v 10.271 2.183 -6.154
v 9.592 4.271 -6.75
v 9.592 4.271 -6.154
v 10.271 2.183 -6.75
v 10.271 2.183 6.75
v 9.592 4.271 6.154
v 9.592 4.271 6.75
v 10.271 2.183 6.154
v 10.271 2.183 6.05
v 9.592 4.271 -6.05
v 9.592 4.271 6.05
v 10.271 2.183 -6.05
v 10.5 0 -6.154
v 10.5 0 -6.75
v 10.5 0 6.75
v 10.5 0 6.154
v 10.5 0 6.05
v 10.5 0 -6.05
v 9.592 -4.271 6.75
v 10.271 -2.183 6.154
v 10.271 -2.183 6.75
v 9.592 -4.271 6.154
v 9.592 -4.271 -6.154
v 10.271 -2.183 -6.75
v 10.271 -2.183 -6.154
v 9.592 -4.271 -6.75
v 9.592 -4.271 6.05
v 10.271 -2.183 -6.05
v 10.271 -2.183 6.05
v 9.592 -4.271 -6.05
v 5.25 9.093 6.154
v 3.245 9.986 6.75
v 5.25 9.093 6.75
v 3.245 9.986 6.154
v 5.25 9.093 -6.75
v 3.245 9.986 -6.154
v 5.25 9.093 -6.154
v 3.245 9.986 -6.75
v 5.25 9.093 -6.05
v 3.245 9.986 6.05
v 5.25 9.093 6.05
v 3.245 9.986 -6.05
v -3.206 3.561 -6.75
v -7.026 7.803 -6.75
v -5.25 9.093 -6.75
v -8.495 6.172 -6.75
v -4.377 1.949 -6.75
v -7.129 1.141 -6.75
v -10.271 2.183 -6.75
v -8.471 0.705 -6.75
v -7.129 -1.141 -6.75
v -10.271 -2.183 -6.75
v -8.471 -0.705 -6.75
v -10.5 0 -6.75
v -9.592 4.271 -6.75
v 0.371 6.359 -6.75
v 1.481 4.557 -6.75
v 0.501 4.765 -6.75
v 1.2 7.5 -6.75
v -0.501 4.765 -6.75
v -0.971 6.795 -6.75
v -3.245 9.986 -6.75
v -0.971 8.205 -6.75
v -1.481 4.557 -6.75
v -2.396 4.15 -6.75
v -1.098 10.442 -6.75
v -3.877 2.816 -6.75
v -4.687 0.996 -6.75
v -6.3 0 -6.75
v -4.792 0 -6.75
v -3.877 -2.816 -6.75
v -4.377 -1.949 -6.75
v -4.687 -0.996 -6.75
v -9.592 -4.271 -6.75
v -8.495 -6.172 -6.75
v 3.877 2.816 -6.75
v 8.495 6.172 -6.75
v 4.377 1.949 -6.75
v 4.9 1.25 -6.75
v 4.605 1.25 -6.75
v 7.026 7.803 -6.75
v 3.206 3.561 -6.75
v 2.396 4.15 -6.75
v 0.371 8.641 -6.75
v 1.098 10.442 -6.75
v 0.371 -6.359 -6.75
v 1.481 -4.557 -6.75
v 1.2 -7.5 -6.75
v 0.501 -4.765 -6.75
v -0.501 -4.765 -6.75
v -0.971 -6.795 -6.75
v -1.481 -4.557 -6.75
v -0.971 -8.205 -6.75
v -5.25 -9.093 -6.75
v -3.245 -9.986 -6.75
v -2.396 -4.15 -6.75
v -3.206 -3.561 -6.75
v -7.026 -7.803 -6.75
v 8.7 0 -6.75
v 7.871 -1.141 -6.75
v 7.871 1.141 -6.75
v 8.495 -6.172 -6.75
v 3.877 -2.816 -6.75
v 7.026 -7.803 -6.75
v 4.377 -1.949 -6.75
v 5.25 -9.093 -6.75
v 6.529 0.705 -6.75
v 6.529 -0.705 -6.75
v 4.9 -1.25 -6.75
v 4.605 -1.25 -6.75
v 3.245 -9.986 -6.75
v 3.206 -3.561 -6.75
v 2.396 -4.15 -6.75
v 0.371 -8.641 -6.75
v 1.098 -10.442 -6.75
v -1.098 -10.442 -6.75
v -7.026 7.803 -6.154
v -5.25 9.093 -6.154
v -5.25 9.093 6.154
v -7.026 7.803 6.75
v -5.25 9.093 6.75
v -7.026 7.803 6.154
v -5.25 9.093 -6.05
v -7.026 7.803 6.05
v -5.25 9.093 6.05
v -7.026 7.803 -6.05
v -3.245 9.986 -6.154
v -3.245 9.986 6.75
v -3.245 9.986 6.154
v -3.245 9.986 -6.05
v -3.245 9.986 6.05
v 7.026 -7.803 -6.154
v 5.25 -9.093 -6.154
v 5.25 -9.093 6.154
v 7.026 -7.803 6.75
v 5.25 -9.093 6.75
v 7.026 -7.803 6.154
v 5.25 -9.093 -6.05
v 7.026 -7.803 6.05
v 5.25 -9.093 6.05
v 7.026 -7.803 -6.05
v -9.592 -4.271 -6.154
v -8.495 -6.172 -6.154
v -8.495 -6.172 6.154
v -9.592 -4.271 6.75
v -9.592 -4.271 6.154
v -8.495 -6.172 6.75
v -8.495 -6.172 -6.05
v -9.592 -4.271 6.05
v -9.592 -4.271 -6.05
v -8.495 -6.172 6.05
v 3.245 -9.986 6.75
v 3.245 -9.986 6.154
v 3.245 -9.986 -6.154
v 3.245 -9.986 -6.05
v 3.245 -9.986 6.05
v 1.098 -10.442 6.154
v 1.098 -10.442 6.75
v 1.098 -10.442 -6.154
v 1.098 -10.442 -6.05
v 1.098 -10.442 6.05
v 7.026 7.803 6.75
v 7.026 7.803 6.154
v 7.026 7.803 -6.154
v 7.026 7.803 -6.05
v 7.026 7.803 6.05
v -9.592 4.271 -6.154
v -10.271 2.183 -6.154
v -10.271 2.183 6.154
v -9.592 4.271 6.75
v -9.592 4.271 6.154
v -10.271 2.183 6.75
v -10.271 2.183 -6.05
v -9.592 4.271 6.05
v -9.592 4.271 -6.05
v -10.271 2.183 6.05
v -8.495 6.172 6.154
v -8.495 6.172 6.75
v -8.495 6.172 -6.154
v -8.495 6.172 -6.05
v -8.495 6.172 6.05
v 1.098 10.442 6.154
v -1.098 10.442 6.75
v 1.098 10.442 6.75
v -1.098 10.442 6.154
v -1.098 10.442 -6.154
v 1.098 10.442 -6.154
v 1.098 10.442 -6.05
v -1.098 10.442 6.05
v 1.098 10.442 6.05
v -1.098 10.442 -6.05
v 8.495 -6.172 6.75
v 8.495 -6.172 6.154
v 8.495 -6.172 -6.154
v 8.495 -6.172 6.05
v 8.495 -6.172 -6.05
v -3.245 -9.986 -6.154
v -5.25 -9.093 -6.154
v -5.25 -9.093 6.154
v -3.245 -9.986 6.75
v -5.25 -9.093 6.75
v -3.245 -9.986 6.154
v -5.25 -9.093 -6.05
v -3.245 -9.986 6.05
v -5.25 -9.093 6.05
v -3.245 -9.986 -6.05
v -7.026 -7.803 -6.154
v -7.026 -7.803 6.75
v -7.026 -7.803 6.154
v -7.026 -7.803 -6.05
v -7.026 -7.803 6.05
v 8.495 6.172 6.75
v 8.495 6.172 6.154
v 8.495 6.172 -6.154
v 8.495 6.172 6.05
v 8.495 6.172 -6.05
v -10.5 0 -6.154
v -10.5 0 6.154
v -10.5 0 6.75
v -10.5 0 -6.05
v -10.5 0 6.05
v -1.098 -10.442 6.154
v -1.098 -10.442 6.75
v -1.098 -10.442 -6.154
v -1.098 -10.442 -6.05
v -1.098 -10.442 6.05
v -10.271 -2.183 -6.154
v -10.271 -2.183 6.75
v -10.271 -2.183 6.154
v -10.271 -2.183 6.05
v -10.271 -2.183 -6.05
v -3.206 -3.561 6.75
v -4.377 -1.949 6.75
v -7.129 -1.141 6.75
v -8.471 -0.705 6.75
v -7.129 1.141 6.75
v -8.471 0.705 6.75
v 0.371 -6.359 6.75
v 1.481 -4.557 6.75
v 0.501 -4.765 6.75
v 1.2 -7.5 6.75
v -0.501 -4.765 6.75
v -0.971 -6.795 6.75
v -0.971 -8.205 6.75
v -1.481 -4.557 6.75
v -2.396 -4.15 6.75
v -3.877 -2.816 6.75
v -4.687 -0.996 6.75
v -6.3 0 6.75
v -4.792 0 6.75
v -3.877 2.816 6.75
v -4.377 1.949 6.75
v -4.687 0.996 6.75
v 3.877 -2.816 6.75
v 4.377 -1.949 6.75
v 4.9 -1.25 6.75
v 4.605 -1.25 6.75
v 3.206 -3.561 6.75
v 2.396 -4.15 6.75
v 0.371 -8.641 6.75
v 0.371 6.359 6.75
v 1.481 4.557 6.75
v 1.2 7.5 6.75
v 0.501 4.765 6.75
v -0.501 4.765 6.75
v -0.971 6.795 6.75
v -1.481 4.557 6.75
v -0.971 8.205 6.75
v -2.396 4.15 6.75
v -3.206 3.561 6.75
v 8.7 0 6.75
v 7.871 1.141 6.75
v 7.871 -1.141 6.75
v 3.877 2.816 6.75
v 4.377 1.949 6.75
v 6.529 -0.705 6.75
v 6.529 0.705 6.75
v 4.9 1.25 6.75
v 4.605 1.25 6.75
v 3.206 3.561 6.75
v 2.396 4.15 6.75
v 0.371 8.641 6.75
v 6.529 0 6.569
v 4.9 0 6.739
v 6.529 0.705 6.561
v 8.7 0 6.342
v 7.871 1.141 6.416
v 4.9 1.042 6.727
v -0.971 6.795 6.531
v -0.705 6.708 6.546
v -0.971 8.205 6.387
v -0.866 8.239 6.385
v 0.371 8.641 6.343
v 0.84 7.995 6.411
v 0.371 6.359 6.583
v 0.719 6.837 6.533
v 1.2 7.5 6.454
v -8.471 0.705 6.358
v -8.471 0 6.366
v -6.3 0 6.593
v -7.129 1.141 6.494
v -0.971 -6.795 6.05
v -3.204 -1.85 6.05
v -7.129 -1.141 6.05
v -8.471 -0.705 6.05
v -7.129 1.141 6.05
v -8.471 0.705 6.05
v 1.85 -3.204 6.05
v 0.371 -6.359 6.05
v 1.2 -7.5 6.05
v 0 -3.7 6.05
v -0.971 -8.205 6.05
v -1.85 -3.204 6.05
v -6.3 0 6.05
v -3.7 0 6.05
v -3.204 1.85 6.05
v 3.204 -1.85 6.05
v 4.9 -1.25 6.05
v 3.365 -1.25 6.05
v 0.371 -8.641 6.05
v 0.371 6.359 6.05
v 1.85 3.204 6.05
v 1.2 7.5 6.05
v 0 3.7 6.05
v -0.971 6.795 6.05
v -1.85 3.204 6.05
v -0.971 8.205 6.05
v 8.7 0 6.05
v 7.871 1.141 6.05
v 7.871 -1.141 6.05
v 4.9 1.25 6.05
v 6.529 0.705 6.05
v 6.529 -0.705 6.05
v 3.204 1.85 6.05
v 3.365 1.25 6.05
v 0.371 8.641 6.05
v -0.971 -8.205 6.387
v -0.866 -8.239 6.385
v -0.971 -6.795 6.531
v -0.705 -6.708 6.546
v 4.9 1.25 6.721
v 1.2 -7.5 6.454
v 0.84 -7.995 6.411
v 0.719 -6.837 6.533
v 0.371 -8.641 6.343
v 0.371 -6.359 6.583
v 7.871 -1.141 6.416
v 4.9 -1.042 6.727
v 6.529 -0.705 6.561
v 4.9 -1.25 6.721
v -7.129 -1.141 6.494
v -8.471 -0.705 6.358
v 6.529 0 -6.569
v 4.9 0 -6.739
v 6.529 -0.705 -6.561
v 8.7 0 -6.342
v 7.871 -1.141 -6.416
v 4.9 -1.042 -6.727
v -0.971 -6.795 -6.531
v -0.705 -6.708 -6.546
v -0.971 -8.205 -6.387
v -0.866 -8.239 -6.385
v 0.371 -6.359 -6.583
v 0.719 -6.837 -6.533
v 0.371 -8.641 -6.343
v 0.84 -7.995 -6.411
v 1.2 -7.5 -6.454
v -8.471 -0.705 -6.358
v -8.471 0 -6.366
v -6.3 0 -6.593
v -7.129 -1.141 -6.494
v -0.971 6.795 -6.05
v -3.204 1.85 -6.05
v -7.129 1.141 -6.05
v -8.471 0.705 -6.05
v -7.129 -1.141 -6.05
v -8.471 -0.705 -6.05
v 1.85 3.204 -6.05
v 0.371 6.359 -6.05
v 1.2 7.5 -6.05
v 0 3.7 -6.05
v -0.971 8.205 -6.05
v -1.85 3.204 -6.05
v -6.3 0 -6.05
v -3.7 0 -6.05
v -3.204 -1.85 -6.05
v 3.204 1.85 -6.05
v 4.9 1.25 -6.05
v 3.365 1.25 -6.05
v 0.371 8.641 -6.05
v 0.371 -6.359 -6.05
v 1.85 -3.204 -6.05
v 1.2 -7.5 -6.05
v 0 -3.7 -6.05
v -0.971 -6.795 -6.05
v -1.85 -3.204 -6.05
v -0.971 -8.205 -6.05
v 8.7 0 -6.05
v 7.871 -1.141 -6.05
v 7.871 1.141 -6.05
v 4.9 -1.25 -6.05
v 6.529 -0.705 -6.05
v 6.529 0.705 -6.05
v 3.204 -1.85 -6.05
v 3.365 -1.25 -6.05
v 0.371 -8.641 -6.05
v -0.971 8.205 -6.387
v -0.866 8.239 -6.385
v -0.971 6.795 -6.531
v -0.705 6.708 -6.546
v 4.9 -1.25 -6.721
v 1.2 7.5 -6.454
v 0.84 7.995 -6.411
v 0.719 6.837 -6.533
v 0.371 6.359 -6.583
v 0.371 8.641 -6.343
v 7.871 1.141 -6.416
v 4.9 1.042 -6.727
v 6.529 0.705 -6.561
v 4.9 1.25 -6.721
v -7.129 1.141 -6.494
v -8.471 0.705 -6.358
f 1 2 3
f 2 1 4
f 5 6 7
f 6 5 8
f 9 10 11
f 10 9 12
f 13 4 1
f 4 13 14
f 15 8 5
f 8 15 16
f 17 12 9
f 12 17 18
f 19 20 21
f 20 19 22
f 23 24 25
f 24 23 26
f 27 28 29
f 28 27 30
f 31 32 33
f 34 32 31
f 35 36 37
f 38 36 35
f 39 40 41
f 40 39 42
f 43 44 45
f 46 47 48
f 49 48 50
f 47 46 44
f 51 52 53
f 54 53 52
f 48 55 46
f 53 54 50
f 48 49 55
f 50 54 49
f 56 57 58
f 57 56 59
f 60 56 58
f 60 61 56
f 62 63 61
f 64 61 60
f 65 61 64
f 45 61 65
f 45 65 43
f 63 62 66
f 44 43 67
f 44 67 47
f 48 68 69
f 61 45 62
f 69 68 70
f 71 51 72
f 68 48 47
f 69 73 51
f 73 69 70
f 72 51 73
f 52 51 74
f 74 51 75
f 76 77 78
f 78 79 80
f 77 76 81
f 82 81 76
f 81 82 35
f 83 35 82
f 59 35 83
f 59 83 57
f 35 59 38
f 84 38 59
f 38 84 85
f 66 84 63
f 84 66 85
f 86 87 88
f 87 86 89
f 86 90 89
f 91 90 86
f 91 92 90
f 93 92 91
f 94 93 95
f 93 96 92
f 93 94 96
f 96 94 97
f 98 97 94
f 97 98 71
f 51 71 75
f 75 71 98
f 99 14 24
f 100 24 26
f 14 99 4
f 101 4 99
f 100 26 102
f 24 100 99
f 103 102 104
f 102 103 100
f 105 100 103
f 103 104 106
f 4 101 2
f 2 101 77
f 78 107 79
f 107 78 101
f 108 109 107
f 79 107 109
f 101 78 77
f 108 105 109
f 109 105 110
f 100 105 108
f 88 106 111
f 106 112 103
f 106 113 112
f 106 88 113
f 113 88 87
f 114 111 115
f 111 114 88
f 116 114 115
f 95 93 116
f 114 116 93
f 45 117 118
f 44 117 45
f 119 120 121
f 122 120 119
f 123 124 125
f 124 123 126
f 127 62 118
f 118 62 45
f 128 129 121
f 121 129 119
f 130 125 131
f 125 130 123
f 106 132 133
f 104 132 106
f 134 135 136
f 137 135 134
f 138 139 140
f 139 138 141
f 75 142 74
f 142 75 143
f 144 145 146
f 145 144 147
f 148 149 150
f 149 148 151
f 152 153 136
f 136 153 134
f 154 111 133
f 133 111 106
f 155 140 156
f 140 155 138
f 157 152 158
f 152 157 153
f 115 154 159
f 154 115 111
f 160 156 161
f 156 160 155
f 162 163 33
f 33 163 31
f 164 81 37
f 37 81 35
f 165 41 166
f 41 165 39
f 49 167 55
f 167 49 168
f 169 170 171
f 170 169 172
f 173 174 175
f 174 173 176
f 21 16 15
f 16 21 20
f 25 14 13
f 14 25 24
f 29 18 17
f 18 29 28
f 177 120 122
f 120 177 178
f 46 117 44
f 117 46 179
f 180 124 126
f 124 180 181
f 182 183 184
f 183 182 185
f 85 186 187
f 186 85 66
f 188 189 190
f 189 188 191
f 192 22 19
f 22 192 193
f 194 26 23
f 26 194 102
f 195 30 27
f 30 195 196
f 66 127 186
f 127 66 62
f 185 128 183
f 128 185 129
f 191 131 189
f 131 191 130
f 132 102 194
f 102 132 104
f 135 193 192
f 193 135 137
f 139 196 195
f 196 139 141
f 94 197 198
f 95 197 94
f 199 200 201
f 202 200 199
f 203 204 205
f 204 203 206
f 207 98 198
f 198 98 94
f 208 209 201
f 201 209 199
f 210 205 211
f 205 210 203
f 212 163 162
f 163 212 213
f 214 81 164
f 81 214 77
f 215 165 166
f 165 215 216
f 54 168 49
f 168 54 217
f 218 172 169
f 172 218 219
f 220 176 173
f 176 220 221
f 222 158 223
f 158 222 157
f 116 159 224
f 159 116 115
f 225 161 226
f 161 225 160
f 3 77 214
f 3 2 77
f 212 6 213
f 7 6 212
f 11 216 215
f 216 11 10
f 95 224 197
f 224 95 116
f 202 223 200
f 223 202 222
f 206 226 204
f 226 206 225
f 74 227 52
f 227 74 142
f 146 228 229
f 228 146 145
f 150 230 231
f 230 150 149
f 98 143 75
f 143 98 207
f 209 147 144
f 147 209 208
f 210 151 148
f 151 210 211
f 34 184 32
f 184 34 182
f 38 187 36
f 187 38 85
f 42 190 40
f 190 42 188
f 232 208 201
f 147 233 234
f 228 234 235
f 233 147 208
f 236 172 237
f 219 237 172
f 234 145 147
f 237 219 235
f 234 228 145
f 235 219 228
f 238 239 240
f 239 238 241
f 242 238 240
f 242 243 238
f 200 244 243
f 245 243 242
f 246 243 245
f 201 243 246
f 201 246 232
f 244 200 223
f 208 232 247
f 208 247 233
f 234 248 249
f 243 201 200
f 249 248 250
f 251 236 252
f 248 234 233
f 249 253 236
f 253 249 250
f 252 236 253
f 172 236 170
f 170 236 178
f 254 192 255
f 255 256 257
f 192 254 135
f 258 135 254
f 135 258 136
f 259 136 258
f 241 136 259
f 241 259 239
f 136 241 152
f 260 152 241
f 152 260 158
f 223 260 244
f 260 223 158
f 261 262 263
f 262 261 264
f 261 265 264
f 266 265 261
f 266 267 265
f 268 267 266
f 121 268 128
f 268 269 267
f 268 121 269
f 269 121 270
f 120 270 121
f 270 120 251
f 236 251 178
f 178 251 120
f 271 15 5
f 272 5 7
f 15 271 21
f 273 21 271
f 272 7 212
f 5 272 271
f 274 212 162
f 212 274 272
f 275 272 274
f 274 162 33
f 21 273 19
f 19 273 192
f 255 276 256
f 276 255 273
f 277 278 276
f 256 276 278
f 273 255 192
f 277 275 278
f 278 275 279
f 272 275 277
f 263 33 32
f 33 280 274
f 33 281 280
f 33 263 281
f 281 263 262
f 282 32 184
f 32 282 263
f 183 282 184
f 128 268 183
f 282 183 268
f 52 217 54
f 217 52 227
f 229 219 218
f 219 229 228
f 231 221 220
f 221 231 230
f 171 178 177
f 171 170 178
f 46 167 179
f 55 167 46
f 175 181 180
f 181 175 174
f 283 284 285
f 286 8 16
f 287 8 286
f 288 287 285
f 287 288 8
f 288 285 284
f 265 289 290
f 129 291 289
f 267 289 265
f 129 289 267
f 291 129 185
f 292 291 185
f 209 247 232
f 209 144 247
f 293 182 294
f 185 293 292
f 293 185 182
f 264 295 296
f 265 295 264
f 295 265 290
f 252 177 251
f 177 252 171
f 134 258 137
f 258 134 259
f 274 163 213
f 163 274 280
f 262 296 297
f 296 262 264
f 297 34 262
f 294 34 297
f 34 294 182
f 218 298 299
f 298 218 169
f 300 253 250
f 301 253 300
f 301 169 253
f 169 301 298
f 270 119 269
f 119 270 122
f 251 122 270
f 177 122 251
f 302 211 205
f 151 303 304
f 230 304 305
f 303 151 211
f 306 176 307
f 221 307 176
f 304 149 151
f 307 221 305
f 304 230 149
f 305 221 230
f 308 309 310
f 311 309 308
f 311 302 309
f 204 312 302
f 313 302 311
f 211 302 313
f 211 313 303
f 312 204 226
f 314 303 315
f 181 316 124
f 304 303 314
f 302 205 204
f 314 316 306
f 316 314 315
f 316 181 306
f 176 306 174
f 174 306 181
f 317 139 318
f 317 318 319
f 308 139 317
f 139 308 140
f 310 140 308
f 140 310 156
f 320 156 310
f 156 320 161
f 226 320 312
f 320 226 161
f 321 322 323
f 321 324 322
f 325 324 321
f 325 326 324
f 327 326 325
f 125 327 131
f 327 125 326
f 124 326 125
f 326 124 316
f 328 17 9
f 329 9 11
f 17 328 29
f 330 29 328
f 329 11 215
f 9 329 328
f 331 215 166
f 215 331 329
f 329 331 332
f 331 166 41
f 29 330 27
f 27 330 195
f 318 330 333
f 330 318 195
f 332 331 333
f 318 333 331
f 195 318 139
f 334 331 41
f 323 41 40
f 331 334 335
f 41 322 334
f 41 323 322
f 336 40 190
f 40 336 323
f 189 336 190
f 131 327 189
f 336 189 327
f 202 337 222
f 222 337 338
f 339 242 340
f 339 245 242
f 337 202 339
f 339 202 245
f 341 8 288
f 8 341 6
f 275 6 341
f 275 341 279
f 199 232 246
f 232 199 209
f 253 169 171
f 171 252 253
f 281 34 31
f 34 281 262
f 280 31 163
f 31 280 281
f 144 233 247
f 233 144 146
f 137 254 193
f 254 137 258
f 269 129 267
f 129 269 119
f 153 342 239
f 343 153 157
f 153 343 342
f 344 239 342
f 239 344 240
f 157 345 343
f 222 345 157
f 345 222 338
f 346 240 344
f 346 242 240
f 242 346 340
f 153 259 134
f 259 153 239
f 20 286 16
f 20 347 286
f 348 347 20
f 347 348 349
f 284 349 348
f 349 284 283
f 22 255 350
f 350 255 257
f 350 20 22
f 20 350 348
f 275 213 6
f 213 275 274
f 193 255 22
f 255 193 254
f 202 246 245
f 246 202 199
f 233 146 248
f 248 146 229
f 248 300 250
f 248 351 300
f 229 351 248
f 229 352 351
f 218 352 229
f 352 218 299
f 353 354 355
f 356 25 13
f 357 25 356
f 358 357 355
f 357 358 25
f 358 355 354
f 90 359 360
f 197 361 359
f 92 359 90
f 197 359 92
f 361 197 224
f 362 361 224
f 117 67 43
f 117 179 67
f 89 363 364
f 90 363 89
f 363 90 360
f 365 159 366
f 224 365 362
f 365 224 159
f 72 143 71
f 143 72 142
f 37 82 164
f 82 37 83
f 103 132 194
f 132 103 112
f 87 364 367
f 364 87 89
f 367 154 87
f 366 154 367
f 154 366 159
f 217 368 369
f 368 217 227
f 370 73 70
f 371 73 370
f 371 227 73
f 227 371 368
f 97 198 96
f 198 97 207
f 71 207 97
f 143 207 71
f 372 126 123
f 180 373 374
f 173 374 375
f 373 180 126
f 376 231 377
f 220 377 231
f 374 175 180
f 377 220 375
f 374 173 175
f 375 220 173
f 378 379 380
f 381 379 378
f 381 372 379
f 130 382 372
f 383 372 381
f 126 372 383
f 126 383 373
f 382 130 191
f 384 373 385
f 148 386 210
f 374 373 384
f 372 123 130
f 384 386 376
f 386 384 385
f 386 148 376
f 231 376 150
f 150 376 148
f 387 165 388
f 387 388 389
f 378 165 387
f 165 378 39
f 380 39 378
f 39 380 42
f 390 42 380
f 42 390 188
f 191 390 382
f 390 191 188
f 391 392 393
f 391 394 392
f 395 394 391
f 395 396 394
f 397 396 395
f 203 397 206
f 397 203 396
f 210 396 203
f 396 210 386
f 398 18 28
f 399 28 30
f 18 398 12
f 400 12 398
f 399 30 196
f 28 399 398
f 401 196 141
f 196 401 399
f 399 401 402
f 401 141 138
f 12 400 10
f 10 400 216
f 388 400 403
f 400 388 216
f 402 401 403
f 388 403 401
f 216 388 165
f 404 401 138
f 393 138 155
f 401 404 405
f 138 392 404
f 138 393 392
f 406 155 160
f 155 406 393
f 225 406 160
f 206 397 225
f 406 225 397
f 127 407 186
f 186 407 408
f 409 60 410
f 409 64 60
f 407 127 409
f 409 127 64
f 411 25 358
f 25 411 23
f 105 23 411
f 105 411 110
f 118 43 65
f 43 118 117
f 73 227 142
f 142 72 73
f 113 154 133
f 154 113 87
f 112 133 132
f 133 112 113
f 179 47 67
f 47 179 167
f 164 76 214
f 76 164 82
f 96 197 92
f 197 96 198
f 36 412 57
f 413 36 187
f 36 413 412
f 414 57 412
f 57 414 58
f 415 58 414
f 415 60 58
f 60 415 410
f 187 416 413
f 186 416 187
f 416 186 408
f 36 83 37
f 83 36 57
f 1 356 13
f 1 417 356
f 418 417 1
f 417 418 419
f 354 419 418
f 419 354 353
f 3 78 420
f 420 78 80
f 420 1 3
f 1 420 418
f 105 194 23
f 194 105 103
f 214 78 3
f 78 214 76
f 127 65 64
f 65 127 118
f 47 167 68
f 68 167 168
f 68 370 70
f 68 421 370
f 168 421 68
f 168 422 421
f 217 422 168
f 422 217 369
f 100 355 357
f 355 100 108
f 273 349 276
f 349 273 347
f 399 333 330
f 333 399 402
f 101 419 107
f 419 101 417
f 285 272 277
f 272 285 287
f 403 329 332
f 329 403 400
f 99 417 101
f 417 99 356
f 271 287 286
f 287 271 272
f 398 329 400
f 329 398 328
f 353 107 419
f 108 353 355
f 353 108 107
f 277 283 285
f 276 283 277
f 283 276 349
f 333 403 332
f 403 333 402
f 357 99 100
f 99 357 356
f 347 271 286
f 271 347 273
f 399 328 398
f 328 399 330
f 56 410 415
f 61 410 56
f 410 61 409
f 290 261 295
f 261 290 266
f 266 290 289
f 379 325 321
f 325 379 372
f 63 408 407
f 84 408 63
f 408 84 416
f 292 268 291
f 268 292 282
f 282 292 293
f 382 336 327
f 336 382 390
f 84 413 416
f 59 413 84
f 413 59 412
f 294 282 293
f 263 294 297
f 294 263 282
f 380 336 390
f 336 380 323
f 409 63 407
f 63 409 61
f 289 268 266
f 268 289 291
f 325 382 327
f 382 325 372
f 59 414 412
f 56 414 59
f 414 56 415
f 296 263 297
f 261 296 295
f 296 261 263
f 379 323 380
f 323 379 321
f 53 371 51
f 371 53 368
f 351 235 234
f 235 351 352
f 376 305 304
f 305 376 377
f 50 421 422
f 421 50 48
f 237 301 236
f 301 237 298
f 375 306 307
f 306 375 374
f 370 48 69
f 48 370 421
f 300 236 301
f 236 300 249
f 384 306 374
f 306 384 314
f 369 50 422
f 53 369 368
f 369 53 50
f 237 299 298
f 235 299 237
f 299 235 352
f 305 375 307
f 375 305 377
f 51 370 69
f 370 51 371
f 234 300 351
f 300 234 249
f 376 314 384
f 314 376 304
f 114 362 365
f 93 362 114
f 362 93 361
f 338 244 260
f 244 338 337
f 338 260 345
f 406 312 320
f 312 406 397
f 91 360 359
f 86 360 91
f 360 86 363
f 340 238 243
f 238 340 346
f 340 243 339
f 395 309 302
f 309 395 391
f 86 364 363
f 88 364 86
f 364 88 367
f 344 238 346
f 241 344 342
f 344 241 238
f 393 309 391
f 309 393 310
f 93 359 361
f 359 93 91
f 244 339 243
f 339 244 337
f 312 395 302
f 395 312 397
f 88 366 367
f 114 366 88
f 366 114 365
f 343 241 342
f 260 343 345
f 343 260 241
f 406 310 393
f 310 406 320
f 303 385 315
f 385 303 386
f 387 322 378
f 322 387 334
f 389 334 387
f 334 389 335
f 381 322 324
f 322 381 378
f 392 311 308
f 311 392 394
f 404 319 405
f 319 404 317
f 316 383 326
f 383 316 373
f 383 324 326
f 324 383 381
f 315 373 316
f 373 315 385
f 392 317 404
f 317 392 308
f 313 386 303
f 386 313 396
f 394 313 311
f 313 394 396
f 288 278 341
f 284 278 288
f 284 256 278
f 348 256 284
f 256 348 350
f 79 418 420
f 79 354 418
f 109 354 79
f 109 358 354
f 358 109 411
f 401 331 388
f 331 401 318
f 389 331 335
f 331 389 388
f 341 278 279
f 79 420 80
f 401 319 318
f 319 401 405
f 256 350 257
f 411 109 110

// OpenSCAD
// Parameters
outer_radius = 10.5; //[5.25:21:0.1]
inner_radius = 3.7; //[1.85:7.4:0.1]
height = 13.5; //[6.75:27:0.1]
overlap = 1; //[0.5:2:0.1]
chamfer_height = 1.2; //[0.6:2.4:0.1]
chamfer_radial = 1.2; //[0.6:2.4:0.1]
mount_hole_count = 4; //[3:8:1]
mount_hole_radius = 1.2; //[0.6:2.4:0.1]
mount_hole_bolt_circle_radius = 7.5; //[3.75:15:0.1]
keyway_width = 2.5; //[1.25:5:0.1]
keyway_depth = 1.2; //[0.6:2.4:0.1]

// Main cylindrical body
module main_cylindrical_body() {
  cylinder(h=height, r=outer_radius, center=true);
}

// Center bore
module center_bore() {
  cylinder(h=height + 2*overlap, r=inner_radius, center=true);
}

// Chamfer cutters
module chamfer_top_cutter() {
  translate([0, 0, height/2 - chamfer_height/2 + overlap/2])
    cylinder(h=chamfer_height, r1=outer_radius + overlap, r2=0, center=true);
}

module chamfer_bottom_cutter() {
  translate([0, 0, -height/2 + chamfer_height/2 - overlap/2])
    rotate([180, 0, 0])
    cylinder(h=chamfer_height, r1=outer_radius + overlap, r2=0, center=true);
}

// Mounting holes
module mount_hole_0() {
  translate([mount_hole_bolt_circle_radius, 0, 0])
    cylinder(h=height + 2*overlap, r=mount_hole_radius, center=true);
}

module mount_hole_1() {
  translate([0, mount_hole_bolt_circle_radius, 0])
    cylinder(h=height + 2*overlap, r=mount_hole_radius, center=true);
}

module mount_hole_2() {
  translate([-mount_hole_bolt_circle_radius, 0, 0])
    cylinder(h=height + 2*overlap, r=mount_hole_radius, center=true);
}

module mount_hole_3() {
  translate([0, -mount_hole_bolt_circle_radius, 0])
    cylinder(h=height + 2*overlap, r=mount_hole_radius, center=true);
}

// Keyway slot
module keyway() {
  translate([inner_radius + (keyway_depth + overlap)/2 - overlap, 0, 0])
    cube([keyway_depth + overlap, keyway_width, height + 2*overlap], center=true);
}

// Final model
module final_model() {
  difference() {
    difference() {
      main_cylindrical_body();
      chamfer_top_cutter();
      chamfer_bottom_cutter();
    }
    union() {
      mount_hole_0();
      mount_hole_1();
      mount_hole_2();
      mount_hole_3();
    }
    center_bore();
    keyway();
  }
}

// Render the final model
color("Silver") final_model();
